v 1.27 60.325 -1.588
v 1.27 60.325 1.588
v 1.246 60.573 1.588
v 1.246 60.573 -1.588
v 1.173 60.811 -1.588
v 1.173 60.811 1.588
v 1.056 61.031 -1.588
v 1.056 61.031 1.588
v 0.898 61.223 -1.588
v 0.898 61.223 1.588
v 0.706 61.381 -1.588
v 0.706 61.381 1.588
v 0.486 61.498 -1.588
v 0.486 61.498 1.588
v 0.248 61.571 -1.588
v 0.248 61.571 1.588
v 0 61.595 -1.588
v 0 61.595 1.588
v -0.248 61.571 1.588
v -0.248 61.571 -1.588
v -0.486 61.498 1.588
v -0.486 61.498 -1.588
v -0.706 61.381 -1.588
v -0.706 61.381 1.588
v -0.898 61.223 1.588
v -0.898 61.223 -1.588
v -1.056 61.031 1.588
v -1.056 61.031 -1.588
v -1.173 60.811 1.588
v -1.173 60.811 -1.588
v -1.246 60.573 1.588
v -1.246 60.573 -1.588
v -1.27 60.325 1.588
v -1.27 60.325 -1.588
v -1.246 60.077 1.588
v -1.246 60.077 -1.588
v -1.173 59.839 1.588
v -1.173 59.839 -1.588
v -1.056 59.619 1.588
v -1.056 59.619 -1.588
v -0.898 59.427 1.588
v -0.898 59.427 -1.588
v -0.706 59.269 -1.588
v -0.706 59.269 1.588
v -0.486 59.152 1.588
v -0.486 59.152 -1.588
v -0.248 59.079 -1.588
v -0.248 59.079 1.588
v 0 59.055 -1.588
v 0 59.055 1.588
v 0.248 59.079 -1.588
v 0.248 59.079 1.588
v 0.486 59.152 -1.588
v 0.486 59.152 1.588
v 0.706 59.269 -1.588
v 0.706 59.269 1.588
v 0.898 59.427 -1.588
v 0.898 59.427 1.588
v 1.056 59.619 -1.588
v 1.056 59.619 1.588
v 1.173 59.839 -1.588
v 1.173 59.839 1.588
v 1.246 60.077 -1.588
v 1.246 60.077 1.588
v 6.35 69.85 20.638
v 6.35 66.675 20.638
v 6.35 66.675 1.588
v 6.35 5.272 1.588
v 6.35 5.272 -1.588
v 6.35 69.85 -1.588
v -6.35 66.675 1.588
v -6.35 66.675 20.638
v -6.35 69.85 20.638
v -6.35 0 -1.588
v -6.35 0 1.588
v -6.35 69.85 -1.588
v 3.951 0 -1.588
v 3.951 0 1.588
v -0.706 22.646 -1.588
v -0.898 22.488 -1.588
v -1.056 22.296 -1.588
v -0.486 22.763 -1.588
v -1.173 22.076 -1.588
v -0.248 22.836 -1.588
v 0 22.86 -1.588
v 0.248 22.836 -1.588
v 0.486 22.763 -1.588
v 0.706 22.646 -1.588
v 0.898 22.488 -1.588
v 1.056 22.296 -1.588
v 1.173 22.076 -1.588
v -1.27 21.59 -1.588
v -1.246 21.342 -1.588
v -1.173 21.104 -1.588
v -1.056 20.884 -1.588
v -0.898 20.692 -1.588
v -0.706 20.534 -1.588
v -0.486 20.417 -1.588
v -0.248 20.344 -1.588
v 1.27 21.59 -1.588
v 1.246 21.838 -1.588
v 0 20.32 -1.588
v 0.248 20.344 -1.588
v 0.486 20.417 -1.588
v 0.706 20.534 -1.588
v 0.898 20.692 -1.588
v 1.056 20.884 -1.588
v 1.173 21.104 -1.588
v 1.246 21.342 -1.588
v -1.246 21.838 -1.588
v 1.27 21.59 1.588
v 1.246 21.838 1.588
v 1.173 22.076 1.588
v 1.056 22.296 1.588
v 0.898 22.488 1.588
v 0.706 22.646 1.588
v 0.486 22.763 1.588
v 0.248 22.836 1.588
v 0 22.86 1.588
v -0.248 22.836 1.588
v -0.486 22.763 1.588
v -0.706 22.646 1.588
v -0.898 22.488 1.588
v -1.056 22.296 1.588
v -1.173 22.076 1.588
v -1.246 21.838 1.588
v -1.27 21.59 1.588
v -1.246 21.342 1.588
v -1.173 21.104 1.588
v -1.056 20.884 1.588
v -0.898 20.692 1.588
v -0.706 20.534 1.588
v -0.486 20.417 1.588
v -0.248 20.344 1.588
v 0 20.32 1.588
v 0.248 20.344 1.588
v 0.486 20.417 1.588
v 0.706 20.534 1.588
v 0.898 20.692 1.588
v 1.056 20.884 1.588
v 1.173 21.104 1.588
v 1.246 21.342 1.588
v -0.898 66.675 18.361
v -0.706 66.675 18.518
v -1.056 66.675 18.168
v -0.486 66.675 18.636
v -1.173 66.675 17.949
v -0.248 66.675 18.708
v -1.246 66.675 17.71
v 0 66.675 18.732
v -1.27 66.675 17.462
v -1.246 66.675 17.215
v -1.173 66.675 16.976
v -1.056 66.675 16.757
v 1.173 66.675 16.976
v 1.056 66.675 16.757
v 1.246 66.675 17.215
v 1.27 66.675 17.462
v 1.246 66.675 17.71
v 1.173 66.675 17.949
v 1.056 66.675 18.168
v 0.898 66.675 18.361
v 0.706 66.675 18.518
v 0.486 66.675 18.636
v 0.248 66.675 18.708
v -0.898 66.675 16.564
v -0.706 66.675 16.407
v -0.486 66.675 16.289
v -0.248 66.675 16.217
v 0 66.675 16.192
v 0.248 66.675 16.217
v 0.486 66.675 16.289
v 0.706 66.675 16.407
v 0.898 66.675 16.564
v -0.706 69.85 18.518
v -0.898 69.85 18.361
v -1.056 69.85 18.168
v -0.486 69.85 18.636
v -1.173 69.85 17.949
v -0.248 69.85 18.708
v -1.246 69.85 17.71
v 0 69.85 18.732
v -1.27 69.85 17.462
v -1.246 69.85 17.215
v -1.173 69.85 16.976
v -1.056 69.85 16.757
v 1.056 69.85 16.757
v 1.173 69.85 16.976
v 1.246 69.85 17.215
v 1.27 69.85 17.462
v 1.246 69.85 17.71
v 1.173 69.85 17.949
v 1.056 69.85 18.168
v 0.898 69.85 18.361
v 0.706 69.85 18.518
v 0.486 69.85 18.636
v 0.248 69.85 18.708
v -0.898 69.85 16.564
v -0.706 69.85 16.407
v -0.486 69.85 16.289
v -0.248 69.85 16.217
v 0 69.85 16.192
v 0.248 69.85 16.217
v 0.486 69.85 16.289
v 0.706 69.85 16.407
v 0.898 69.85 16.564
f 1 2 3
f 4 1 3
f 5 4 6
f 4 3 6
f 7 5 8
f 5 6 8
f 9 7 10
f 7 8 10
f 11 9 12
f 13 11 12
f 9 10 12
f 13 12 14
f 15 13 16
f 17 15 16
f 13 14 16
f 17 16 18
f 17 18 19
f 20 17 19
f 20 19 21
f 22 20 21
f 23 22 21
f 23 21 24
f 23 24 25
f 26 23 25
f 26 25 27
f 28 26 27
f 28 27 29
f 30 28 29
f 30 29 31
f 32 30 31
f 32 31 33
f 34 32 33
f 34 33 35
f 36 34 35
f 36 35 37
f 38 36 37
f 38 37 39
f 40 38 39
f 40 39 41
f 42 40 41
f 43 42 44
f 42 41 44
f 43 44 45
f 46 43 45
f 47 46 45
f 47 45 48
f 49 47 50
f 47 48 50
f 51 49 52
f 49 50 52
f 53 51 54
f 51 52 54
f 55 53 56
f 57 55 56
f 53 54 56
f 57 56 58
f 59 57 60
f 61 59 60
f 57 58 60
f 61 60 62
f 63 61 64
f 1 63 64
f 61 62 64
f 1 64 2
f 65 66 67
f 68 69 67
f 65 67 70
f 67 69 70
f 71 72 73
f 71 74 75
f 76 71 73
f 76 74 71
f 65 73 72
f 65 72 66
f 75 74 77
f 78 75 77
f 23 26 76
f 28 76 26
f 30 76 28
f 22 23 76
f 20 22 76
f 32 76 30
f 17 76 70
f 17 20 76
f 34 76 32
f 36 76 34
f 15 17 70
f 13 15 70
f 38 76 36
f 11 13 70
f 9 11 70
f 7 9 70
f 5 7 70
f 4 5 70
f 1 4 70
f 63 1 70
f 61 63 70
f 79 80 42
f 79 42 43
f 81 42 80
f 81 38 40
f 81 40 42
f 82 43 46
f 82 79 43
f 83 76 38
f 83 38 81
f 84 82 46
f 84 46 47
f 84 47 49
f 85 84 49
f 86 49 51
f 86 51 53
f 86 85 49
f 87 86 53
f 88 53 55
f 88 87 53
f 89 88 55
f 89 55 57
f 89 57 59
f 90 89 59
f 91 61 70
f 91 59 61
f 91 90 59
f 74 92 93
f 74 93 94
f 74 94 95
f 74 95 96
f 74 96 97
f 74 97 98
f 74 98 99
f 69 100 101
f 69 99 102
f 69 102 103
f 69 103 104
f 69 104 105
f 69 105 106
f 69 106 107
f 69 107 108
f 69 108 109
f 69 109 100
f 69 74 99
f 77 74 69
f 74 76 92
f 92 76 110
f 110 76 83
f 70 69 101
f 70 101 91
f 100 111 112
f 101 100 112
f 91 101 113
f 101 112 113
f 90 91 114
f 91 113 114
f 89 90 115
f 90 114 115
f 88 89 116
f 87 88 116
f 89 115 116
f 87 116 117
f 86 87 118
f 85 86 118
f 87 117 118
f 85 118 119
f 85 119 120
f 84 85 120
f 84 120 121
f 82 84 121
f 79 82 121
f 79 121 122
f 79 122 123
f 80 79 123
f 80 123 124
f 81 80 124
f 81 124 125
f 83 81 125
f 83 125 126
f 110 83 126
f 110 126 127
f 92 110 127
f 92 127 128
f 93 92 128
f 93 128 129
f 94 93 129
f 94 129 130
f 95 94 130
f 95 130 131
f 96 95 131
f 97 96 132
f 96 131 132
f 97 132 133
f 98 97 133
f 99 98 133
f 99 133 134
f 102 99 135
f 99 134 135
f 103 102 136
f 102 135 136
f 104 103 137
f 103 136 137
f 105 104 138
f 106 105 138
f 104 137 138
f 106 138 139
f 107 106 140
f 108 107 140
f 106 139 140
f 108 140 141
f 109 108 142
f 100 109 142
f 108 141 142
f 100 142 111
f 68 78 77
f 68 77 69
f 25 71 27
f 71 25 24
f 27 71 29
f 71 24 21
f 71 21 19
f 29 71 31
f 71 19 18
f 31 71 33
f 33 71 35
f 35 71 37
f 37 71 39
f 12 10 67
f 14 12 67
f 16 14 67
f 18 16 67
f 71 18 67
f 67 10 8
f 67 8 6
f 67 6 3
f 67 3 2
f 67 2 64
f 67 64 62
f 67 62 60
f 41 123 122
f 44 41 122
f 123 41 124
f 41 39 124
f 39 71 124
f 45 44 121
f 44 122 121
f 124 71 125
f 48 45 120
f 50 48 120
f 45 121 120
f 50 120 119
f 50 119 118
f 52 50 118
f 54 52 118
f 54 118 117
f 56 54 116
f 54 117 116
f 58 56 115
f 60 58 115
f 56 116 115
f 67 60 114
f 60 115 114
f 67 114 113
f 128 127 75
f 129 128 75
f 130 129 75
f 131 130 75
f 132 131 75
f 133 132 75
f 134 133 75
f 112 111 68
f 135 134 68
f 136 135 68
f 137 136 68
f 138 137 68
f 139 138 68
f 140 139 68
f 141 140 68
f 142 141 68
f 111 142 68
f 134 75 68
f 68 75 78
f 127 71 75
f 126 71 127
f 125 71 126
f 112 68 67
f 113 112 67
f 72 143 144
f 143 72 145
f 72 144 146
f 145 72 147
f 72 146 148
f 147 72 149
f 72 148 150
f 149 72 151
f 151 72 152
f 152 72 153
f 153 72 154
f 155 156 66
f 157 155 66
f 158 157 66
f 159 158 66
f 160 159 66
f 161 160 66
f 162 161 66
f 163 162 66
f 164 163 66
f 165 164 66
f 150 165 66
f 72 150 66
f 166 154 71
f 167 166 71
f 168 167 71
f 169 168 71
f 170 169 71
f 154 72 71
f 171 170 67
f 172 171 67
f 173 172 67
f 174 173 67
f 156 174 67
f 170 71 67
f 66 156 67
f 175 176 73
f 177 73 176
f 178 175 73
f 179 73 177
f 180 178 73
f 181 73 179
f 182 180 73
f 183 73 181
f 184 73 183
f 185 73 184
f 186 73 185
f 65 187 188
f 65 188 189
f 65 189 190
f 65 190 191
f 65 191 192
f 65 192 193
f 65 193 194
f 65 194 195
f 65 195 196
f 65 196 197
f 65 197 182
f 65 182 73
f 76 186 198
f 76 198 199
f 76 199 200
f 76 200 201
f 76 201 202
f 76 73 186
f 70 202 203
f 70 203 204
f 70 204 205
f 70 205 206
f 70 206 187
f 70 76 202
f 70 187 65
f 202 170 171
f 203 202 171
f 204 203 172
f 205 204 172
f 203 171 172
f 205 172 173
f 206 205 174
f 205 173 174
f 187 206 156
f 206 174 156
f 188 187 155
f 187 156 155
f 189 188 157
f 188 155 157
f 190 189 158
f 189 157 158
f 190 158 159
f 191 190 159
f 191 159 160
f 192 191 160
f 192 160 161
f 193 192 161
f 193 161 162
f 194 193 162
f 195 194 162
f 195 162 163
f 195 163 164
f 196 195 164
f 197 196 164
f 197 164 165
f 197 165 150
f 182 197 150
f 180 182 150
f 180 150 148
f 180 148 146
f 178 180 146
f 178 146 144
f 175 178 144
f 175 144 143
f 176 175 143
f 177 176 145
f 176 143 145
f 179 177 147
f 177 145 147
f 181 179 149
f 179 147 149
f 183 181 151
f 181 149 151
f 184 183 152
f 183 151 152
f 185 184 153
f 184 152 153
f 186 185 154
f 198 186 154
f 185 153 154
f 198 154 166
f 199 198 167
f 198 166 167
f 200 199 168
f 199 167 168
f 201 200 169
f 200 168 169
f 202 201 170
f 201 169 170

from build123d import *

# Parameters (mm, degrees)
SKETCH1_W           = 12.7
SKETCH1_H           = 3.175
BOSS_EXTRUDE1_DEPTH = 69.85
SKETCH2_W           = 12.7
SKETCH2_H           = 3.175
BOSS_EXTRUDE2_DEPTH = 19.05
SKETCH3_R           = 1.27
CUT_EXTRUDE1_DEPTH  = 71.084124673
SKETCH4_R           = 1.27
CUT_EXTRUDE2_DEPTH  = 73.679071953
CUT_EXTRUDE3_DEPTH  = 73.679071953


with BuildPart() as part:
    # Sketch1 → Boss-Extrude1 (new body)
    with BuildSketch(Plane(origin=(0, 0, 0), x_dir=(1, 0, 0), z_dir=(0, 1, 0))):
        Rectangle(SKETCH1_W, SKETCH1_H)
    extrude(amount=BOSS_EXTRUDE1_DEPTH)

    # Sketch2 → Boss-Extrude2 (add)
    with BuildSketch(Plane.XY.offset(1.5875)):
        with Locations((0, 68.2625)):
            Rectangle(SKETCH2_W, SKETCH2_H)
    extrude(amount=BOSS_EXTRUDE2_DEPTH)

    # Sketch3 → Cut-Extrude1 (cut, through all)
    with BuildSketch(Plane.XZ.offset(-66.675)):
        with Locations(Location((0, 17.4625, 0), (0, 0, 270))):
            Circle(SKETCH3_R)
    extrude(amount=-CUT_EXTRUDE1_DEPTH, mode=Mode.SUBTRACT)

    # Sketch4 → Cut-Extrude2 (cut, through all)
    with BuildSketch(Plane.XY.offset(1.5875)):
        with Locations((0, 21.59)):
            Circle(SKETCH4_R)
        with Locations((0, 60.325)):
            Circle(SKETCH4_R)
    extrude(amount=-CUT_EXTRUDE2_DEPTH, mode=Mode.SUBTRACT)

    # Sketch6 → Cut-Extrude3 (cut, through all)
    with BuildSketch(Plane.XY.offset(1.5875)):
        Polygon((3.951482723, 0), (6.35, 5.27166953), (6.35, 0), align=None)
    extrude(amount=-CUT_EXTRUDE3_DEPTH, mode=Mode.SUBTRACT)


solid = part.part
